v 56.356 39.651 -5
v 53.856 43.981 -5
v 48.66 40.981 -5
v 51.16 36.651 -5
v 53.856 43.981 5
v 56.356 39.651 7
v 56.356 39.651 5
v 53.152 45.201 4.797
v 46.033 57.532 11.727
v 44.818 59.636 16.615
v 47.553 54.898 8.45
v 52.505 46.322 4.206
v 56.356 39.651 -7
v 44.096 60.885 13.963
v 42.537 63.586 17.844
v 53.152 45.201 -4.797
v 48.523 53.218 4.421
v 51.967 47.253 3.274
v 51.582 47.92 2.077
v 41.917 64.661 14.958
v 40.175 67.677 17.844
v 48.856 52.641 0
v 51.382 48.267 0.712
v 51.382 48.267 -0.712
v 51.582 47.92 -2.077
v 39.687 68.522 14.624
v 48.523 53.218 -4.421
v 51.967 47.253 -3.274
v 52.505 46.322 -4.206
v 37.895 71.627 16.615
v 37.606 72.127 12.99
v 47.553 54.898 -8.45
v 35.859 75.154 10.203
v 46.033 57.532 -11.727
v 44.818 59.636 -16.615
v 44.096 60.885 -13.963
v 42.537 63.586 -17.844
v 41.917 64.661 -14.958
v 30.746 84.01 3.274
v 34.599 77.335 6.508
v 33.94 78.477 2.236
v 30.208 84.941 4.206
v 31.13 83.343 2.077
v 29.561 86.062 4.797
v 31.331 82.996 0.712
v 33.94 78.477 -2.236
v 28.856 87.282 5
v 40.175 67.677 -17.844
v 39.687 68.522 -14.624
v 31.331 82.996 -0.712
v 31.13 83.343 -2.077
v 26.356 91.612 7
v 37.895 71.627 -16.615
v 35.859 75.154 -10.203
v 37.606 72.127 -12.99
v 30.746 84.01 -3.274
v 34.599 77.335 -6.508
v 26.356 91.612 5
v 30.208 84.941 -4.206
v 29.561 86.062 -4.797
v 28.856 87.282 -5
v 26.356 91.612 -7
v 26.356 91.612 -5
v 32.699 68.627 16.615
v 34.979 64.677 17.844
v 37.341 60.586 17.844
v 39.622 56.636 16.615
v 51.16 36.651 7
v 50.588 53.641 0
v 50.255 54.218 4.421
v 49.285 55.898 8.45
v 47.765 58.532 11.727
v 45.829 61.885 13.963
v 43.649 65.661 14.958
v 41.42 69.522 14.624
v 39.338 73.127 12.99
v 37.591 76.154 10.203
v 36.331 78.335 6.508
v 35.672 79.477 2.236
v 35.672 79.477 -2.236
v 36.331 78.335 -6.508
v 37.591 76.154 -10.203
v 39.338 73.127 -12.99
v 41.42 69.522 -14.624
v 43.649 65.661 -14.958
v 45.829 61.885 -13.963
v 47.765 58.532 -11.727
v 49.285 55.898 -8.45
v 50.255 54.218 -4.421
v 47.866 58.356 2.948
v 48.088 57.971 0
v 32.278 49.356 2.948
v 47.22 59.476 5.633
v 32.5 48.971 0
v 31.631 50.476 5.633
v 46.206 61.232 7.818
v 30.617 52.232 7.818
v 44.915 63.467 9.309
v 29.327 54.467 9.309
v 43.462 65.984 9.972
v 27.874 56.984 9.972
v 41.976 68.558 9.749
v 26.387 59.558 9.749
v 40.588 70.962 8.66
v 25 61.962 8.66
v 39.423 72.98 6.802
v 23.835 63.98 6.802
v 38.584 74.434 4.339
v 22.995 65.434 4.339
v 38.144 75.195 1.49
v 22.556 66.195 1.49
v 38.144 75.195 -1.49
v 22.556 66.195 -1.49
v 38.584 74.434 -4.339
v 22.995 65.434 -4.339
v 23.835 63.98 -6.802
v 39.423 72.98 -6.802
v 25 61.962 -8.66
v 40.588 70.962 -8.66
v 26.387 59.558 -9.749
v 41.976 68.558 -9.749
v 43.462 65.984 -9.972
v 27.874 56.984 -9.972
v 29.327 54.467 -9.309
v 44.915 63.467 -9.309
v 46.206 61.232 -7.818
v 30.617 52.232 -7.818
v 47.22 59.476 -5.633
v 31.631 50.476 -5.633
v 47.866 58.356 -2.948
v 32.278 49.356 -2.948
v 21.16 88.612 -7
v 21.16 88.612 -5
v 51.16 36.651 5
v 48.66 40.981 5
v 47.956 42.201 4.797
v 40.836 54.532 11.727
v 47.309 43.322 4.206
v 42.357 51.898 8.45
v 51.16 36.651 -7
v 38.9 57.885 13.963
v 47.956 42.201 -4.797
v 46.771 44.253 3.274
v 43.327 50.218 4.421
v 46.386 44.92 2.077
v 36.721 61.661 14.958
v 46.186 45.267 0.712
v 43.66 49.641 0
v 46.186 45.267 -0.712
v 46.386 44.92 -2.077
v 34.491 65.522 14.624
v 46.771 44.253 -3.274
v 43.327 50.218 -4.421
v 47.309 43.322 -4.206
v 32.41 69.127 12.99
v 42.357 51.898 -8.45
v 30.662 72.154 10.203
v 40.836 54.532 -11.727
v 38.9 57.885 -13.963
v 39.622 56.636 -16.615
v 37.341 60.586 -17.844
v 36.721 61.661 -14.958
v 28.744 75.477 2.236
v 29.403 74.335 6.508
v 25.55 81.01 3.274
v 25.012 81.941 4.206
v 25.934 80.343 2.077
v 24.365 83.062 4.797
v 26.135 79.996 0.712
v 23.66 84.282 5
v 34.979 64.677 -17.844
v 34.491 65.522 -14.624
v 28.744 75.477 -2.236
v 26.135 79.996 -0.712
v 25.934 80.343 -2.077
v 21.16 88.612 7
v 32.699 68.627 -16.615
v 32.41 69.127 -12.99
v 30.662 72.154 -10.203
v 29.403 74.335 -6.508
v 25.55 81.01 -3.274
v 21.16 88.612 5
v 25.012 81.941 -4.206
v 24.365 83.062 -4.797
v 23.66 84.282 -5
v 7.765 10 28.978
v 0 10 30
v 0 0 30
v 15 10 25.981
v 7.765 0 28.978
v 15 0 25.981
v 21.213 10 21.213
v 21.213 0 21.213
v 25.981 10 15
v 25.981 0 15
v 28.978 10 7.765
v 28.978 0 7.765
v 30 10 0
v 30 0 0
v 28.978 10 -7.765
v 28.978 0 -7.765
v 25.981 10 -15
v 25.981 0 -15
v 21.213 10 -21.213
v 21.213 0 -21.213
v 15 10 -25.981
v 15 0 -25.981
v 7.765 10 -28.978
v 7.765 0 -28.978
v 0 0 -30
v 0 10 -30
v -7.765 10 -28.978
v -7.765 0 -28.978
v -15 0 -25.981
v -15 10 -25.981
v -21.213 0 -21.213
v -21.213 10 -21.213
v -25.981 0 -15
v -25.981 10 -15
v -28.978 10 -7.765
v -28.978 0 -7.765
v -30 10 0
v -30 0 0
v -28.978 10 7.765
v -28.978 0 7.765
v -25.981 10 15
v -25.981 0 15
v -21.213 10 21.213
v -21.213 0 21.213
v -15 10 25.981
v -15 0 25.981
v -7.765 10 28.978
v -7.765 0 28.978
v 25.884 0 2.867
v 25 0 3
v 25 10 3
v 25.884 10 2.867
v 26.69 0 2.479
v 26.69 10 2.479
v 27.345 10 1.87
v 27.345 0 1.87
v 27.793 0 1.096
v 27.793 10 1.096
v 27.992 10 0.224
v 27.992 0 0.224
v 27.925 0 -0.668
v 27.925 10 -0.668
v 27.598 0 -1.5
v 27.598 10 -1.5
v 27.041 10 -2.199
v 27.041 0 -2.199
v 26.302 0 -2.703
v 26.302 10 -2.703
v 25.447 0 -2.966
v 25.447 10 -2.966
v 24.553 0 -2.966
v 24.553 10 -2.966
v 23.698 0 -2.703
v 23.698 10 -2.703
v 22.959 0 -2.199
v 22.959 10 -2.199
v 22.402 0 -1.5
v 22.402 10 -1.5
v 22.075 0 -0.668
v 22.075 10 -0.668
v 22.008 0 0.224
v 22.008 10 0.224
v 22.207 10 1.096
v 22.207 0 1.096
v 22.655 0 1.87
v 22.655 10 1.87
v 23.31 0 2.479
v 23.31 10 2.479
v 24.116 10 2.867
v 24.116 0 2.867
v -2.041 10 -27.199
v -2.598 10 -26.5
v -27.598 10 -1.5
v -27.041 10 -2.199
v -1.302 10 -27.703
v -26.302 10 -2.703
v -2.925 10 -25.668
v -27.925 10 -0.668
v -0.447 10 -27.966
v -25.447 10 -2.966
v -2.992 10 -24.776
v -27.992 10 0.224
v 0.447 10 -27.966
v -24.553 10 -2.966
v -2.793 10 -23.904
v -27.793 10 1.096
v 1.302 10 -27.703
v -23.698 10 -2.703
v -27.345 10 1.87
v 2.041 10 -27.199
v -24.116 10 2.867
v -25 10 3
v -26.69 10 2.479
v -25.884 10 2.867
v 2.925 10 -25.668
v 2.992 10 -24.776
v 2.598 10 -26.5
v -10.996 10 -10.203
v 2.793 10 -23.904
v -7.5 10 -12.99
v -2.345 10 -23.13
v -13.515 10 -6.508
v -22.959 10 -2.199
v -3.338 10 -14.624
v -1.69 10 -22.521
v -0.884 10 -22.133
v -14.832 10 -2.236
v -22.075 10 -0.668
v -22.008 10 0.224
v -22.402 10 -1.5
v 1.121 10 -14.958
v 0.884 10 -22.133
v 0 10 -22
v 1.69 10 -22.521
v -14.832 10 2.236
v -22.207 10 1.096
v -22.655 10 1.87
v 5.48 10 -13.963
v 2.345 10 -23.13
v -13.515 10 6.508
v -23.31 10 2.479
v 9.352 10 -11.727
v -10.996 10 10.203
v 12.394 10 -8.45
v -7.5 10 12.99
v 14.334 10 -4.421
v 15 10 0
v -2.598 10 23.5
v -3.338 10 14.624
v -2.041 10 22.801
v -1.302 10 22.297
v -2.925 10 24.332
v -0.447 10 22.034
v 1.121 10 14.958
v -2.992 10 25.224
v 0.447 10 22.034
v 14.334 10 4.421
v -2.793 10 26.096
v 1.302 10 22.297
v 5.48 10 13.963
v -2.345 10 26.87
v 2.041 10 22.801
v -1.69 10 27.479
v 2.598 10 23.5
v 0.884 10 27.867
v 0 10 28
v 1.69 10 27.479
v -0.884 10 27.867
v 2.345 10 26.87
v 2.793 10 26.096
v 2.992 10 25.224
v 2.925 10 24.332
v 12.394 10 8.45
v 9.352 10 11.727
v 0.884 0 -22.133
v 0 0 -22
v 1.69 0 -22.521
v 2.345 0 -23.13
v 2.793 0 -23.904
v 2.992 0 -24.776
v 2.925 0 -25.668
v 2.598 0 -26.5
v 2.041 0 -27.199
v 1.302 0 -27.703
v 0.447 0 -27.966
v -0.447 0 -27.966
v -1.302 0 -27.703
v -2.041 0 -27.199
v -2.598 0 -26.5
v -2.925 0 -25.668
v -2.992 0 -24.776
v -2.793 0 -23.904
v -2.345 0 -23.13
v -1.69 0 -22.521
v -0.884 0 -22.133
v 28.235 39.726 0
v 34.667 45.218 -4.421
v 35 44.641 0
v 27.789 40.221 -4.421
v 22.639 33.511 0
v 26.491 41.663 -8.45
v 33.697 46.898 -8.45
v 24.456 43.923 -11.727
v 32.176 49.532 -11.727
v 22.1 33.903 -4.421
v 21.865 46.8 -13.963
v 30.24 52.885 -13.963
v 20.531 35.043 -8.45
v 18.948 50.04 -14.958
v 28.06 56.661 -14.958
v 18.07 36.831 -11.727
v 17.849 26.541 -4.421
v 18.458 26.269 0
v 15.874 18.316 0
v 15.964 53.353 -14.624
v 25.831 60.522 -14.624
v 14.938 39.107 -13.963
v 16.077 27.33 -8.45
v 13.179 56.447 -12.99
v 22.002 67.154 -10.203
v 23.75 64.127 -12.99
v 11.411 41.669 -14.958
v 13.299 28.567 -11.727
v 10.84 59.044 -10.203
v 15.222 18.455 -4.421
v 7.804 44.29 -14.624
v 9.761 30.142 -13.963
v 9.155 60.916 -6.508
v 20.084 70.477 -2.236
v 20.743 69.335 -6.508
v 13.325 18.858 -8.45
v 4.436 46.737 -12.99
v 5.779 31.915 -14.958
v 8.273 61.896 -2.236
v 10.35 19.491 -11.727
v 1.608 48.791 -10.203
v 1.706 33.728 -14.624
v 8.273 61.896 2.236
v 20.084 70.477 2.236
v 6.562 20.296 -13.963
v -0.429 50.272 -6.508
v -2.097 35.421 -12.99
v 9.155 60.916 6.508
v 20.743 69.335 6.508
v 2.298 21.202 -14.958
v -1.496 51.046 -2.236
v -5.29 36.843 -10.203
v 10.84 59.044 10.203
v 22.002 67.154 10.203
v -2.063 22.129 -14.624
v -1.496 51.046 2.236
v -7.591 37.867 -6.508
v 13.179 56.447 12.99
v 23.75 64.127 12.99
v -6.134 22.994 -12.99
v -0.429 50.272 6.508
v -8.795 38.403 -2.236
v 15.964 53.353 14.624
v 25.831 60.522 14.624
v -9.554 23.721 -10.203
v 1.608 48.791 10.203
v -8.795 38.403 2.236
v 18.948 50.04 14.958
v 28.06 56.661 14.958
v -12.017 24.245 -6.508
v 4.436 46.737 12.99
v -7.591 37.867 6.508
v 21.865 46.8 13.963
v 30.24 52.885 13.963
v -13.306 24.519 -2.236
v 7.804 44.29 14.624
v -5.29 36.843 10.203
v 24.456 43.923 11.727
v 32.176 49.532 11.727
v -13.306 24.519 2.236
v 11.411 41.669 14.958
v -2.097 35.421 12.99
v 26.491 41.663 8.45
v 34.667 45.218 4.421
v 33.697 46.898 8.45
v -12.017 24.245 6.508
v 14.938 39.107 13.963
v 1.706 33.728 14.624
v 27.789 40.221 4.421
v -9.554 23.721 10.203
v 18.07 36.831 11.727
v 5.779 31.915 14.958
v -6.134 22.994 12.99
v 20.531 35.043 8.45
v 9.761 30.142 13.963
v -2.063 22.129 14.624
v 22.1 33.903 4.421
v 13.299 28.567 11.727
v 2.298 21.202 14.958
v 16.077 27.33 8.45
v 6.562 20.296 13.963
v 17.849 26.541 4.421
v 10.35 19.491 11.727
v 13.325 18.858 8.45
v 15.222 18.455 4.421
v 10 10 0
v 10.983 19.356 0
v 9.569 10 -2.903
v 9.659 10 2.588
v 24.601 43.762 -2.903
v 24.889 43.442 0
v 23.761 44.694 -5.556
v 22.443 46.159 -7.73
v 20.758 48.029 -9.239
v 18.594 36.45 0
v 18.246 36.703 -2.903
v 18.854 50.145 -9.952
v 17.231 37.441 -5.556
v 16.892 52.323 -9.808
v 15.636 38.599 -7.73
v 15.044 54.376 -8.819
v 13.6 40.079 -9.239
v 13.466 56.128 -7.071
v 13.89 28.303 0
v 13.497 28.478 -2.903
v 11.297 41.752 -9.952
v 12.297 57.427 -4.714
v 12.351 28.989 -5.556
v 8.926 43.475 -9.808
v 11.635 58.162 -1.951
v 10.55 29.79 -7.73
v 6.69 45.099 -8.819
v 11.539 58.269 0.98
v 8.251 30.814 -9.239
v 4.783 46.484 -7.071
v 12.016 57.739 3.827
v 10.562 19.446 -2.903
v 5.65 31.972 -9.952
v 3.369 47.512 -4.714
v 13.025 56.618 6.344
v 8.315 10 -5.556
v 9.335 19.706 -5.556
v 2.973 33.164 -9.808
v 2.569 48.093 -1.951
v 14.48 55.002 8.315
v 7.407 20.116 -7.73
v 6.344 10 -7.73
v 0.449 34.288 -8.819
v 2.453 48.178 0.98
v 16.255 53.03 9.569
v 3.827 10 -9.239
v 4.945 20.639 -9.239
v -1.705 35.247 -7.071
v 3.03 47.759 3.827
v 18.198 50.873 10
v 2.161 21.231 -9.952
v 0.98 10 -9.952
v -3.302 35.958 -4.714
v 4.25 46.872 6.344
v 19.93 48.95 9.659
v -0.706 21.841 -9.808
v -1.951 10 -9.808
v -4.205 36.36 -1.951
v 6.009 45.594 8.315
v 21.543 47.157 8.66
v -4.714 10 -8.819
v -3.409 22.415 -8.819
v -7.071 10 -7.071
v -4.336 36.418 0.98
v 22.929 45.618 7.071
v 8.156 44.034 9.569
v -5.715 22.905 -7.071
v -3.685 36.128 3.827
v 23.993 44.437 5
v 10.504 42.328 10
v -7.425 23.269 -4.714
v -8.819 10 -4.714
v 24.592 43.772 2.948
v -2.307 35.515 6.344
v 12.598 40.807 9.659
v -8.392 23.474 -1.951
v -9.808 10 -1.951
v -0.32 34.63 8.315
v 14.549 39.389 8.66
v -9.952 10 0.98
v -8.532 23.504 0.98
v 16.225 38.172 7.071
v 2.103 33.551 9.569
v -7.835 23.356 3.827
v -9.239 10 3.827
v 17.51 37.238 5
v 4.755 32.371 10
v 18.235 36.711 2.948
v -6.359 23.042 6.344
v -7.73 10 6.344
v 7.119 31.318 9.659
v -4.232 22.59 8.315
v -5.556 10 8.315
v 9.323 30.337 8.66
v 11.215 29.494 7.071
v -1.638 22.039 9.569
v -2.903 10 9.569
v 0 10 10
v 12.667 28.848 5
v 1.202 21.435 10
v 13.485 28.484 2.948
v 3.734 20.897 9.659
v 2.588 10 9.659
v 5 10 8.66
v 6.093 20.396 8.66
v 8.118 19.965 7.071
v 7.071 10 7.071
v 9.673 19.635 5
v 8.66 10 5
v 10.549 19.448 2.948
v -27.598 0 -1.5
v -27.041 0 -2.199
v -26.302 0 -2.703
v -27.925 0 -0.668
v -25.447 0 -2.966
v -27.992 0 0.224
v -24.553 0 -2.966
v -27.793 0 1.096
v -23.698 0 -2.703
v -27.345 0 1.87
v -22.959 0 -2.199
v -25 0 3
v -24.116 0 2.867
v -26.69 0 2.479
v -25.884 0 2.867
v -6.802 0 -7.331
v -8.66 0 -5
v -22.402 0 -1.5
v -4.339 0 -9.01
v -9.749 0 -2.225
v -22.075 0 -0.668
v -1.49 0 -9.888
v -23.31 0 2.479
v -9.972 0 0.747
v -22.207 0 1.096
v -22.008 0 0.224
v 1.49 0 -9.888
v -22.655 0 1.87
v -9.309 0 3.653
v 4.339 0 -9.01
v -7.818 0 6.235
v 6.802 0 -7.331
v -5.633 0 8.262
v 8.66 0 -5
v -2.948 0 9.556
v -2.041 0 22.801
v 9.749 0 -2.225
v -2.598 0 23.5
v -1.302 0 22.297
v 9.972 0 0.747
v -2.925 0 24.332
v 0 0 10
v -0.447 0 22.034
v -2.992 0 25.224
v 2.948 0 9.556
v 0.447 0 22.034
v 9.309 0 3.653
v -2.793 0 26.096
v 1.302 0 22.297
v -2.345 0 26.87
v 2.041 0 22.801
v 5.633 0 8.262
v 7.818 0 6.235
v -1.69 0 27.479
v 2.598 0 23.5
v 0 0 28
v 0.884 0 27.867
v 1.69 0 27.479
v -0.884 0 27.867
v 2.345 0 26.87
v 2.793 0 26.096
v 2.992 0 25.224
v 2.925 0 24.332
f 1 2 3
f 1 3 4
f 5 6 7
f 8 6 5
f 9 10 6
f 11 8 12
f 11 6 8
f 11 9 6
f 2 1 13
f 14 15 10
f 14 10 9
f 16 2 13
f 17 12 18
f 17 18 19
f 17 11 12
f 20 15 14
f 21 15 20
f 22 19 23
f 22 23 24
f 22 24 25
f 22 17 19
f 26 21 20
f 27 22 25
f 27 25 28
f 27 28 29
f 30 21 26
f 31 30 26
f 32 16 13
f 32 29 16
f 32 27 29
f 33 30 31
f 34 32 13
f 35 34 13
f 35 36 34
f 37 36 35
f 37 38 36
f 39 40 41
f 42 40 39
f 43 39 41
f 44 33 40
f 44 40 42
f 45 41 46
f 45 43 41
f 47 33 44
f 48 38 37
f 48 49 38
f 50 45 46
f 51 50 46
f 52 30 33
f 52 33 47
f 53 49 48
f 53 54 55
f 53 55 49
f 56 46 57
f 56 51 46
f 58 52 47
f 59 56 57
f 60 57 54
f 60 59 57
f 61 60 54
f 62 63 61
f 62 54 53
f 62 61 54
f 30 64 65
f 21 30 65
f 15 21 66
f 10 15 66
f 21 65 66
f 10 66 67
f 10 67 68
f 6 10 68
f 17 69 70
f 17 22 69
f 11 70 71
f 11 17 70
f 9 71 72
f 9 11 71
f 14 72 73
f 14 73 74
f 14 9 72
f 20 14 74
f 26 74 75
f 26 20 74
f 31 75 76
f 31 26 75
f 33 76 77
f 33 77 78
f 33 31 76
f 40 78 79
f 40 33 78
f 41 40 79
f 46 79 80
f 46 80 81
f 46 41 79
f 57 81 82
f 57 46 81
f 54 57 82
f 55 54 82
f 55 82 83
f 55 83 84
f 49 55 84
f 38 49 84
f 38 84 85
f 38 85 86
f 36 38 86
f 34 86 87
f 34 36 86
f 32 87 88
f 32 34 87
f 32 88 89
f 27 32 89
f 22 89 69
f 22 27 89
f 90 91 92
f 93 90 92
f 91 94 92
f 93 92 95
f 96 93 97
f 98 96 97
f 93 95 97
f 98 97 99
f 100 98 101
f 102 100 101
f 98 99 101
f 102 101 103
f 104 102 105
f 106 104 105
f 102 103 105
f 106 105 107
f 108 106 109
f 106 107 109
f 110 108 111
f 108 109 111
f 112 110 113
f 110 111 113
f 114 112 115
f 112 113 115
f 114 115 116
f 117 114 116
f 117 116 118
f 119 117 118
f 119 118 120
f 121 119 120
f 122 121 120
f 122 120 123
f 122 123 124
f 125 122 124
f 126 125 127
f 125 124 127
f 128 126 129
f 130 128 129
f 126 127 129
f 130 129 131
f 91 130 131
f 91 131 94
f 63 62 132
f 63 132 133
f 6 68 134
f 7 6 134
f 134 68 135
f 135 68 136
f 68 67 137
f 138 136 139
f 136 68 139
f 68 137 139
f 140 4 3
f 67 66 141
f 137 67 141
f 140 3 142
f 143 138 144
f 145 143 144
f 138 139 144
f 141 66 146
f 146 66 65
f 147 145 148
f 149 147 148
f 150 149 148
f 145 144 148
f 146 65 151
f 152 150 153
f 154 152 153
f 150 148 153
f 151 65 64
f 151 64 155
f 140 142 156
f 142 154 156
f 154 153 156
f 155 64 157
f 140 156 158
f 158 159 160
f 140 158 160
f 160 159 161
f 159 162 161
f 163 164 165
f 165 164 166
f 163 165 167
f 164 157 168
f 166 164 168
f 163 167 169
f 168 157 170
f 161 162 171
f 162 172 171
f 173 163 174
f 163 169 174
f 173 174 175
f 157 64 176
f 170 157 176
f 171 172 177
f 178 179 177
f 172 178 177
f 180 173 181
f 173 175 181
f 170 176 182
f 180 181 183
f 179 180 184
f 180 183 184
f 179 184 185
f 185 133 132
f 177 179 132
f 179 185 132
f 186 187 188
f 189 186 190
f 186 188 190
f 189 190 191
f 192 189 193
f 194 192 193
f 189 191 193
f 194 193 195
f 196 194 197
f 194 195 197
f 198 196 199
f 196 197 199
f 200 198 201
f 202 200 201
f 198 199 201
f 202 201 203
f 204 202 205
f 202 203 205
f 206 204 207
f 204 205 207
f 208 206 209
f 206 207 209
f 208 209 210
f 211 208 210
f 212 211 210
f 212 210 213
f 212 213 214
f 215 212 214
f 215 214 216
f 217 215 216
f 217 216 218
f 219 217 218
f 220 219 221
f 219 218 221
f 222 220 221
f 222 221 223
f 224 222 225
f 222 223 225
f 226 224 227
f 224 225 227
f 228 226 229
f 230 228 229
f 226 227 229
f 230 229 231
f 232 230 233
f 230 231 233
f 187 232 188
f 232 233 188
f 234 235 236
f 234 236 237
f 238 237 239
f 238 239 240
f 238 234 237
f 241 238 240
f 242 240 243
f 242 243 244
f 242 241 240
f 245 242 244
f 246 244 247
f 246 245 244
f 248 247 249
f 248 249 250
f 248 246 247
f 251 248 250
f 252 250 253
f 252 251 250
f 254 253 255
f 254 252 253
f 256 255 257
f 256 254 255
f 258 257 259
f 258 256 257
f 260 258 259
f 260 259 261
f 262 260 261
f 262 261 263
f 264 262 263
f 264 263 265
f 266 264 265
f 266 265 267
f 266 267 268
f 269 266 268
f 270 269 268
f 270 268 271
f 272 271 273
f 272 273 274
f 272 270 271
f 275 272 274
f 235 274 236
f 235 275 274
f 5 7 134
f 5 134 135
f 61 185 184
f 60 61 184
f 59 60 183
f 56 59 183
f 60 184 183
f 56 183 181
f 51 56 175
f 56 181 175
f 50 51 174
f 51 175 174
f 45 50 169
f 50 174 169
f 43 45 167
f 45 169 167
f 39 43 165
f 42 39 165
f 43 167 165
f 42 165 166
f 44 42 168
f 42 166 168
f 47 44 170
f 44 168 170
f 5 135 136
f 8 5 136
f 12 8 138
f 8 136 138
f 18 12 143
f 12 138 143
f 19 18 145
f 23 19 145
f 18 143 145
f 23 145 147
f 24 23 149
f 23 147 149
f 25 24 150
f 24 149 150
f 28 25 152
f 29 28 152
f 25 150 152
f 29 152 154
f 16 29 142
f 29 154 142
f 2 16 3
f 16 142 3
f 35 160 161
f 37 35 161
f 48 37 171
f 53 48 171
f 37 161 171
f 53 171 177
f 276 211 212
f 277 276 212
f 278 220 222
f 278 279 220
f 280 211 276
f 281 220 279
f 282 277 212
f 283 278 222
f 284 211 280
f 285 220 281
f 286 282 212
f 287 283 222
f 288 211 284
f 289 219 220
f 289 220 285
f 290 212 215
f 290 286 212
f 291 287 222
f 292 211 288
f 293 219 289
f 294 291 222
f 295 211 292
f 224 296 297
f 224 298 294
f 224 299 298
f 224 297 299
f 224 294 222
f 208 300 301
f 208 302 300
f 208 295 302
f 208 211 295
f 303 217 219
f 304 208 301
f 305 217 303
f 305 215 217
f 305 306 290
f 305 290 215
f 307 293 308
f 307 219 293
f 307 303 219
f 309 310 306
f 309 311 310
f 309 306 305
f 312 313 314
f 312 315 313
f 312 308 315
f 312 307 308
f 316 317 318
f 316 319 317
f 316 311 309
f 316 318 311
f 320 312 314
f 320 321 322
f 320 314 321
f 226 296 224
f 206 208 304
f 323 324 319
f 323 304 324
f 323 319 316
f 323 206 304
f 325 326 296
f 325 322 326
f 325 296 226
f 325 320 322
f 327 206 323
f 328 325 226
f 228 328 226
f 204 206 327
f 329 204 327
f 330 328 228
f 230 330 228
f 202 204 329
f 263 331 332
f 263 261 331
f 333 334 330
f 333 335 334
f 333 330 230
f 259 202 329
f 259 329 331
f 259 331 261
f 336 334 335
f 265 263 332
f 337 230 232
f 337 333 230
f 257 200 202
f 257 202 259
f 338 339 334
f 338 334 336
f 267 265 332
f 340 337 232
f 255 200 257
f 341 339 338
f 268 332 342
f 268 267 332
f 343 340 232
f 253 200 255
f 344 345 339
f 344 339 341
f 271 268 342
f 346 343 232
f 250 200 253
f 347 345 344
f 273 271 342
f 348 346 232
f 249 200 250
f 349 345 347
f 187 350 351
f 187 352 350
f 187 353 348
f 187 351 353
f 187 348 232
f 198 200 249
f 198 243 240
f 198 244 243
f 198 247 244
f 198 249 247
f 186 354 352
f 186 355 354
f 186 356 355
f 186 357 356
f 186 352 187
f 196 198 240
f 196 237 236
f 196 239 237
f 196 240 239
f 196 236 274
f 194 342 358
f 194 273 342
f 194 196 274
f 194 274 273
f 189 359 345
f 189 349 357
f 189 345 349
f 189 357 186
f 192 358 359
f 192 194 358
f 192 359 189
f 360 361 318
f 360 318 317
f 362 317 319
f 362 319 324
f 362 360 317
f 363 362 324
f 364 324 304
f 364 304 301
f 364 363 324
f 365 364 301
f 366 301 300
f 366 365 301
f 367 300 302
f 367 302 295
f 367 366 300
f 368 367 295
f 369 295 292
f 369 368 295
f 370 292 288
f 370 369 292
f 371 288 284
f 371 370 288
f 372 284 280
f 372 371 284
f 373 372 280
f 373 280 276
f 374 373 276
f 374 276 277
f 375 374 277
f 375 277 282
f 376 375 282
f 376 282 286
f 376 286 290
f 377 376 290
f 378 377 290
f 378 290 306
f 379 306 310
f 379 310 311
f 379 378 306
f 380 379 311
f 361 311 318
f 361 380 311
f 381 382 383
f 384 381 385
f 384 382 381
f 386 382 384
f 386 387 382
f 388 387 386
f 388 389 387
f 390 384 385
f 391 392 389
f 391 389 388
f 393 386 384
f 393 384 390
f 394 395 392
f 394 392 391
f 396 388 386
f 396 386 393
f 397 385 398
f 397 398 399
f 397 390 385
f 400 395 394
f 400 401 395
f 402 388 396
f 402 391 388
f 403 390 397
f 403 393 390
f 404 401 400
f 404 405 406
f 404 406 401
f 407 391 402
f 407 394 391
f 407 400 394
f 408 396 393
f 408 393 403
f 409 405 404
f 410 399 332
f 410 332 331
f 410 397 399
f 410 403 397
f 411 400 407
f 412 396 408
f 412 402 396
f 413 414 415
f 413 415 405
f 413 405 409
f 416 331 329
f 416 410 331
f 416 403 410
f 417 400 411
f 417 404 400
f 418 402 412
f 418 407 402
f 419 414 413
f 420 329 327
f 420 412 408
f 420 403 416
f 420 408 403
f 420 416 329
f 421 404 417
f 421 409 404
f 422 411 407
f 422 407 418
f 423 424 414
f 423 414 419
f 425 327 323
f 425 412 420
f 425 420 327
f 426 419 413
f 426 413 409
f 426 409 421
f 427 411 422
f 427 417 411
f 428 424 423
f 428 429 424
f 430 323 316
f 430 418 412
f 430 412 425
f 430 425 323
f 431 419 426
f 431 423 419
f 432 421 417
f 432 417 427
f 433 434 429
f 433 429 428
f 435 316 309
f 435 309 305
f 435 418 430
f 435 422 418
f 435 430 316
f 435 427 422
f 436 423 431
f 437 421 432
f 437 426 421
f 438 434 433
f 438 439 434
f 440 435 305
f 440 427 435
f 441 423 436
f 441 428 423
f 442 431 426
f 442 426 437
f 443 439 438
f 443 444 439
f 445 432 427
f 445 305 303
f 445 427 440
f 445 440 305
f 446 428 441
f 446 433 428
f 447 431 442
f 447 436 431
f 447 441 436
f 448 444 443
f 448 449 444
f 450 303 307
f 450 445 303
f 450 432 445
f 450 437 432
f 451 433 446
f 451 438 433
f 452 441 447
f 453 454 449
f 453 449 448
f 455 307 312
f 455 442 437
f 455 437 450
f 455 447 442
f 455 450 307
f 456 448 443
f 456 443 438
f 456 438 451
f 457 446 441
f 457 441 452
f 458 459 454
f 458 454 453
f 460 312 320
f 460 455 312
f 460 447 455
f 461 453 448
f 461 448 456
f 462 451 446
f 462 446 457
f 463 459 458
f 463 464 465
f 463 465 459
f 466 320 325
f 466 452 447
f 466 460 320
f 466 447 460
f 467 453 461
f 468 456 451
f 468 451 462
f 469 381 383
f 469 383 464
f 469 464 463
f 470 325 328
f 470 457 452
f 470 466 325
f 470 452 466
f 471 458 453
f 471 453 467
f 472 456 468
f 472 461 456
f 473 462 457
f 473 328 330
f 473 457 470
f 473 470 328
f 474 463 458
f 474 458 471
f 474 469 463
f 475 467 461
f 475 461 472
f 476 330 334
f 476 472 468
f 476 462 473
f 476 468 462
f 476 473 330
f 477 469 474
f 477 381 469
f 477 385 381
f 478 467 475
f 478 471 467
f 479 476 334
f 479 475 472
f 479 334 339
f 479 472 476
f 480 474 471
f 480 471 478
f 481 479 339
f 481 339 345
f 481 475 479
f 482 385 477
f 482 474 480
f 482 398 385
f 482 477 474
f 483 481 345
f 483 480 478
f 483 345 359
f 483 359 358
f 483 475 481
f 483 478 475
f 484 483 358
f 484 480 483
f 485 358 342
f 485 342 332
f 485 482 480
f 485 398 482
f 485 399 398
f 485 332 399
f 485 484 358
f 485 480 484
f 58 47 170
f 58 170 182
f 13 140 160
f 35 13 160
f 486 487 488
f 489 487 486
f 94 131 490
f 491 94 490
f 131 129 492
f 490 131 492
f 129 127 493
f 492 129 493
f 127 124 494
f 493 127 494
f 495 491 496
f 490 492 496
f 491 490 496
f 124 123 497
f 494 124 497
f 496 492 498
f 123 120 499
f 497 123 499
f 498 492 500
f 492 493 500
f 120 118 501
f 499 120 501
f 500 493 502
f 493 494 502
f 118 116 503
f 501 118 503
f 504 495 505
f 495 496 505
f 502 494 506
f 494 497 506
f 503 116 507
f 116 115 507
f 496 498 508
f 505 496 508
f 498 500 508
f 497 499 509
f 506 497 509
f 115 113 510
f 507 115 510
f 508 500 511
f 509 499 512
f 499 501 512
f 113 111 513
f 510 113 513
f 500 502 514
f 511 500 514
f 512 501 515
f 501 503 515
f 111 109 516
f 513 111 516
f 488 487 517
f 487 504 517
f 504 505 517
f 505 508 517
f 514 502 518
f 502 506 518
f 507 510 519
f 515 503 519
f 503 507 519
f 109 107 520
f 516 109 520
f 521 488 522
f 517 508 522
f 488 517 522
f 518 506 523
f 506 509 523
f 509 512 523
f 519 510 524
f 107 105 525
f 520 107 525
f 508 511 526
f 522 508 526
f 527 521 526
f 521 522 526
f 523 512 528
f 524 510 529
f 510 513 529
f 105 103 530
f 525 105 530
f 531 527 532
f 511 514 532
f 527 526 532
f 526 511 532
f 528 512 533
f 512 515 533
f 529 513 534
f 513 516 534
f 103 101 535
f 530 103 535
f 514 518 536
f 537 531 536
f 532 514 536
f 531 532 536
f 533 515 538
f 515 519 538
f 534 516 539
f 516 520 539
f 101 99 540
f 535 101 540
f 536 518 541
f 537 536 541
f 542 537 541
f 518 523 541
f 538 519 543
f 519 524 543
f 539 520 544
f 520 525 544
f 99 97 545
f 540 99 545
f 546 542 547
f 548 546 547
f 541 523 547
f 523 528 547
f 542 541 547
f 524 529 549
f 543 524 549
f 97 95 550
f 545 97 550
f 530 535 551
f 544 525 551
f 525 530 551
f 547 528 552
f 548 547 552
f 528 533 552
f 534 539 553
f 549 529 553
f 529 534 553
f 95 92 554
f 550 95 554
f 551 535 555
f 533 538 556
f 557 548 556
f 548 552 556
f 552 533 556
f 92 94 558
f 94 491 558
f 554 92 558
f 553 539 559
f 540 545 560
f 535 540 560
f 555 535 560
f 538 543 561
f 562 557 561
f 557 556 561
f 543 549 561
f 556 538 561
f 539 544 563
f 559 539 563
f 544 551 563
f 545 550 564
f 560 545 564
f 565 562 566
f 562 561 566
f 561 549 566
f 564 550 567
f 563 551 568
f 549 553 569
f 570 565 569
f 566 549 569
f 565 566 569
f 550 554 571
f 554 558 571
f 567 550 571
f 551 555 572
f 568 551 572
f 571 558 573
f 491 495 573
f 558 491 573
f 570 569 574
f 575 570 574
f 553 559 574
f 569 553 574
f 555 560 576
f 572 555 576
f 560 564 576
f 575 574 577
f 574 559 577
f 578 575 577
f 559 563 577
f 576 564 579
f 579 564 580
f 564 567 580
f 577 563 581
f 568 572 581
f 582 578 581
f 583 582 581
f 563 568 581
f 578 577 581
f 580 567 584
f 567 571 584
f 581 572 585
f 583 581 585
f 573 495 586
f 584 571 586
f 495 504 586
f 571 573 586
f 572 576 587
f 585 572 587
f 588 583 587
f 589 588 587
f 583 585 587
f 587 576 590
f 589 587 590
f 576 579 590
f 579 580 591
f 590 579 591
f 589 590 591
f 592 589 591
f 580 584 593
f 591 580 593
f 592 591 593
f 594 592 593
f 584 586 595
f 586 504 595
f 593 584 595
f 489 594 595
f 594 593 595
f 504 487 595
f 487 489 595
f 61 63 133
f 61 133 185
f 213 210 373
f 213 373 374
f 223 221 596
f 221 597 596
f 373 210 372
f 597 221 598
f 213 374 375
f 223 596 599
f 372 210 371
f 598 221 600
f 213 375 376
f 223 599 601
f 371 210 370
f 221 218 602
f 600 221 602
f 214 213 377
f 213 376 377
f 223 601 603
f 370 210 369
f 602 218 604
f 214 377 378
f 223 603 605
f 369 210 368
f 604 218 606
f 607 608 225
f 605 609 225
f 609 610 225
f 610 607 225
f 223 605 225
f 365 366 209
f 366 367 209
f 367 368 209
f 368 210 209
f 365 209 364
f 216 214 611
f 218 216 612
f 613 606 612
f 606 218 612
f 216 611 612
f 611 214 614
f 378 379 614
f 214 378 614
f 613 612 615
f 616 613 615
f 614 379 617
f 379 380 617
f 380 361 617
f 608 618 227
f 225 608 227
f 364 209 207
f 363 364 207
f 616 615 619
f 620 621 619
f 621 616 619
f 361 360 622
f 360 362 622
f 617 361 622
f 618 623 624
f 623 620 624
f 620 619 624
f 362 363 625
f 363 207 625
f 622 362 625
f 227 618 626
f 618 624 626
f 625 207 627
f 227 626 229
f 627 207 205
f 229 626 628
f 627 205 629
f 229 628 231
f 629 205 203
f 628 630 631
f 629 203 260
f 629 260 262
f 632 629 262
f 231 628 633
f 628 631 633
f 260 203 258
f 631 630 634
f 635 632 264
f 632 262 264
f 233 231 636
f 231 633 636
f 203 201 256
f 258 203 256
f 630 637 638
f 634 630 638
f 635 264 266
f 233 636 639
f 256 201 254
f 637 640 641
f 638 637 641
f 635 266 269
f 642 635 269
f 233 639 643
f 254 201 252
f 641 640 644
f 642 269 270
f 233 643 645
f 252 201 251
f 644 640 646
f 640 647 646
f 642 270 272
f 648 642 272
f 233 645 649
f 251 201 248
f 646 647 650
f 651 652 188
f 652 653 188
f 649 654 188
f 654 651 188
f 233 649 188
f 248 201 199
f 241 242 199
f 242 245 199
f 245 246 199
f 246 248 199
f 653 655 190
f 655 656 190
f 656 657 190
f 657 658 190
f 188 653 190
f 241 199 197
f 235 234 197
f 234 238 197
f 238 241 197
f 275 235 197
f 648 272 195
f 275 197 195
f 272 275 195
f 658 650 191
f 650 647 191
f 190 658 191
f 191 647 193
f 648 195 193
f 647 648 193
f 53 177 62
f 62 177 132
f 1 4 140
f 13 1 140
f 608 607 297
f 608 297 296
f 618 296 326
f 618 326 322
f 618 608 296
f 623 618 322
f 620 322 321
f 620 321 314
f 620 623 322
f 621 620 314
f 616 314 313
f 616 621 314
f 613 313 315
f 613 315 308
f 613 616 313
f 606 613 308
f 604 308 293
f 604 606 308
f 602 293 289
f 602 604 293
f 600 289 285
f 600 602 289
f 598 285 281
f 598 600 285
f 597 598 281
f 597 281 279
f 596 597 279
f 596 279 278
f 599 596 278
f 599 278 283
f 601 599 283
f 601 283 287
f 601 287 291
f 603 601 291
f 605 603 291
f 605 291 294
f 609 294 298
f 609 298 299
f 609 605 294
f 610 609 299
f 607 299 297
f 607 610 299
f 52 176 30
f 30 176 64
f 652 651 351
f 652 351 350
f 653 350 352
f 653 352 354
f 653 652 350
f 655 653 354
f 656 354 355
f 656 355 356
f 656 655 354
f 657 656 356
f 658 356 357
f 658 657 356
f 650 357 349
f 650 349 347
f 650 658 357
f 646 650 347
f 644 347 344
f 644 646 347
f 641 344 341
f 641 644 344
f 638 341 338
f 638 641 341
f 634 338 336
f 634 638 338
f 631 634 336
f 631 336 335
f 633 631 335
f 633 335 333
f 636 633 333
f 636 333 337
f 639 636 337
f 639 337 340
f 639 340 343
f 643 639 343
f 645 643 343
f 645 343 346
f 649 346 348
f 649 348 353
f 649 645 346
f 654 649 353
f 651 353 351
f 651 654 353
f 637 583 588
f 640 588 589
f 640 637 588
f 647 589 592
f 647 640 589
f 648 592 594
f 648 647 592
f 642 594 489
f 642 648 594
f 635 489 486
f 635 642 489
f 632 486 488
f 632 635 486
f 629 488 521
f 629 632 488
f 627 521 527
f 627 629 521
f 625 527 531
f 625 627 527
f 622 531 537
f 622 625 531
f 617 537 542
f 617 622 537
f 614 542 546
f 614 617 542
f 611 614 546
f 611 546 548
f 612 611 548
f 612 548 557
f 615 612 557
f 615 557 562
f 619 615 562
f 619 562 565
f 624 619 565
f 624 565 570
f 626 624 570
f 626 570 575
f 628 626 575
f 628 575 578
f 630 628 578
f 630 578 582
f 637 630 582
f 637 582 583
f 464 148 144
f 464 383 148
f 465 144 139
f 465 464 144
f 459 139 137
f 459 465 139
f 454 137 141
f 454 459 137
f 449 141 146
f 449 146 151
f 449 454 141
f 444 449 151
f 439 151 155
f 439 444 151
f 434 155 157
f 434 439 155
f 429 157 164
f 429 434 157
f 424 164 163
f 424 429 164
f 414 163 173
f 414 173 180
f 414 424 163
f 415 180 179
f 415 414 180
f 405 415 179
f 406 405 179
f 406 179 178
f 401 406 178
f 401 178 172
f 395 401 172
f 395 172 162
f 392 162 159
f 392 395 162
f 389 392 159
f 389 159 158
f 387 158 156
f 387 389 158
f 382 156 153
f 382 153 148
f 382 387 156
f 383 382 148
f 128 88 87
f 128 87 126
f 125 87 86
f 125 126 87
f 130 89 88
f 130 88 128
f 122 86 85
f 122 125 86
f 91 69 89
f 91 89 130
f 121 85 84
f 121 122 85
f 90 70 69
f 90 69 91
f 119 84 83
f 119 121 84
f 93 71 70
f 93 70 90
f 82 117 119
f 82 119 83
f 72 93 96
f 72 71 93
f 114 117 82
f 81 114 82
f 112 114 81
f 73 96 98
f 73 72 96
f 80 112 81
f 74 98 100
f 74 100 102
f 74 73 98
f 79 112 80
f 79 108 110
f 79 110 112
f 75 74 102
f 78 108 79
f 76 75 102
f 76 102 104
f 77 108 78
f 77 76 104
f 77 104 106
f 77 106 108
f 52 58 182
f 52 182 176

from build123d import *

# Parameters (mm, degrees)
SKETCH_1_R      = 30
SKETCH_1_R_2    = 10
SKETCH_1_R_3    = 3
EXTRUDE_1_DEPTH = 10
SKETCH_2_R      = 15
SKETCH_2_R_2    = 10
EXTRUDE_START   = -6
SKETCH_5_R      = 10
EXTRUDE_2_DEPTH = 6


with BuildPart() as part:
    # 草图1 → 凸台-拉伸1 (new body)
    with BuildSketch(Plane(origin=(0, 0, 0), x_dir=(1, 0, 0), z_dir=(0, 1, 0))):
        with Locations(Location((0, 0, 0), (0, 0, 270))):
            Circle(SKETCH_1_R)
        with Locations(Location((0, 0, 0), (0, 0, 270))):
            Circle(SKETCH_1_R_2, mode=Mode.SUBTRACT)
        with Locations(Location((25, 0, 0), (0, 0, 270))):
            Circle(SKETCH_1_R_3, mode=Mode.SUBTRACT)
        with Locations(Location((0, -25, 0), (0, 0, 270))):
            Circle(SKETCH_1_R_3, mode=Mode.SUBTRACT)
        with Locations(Location((-25, 0, 0), (0, 0, 270))):
            Circle(SKETCH_1_R_3, mode=Mode.SUBTRACT)
        with Locations(Location((0, 25, 0), (0, 0, 270))):
            Circle(SKETCH_1_R_3, mode=Mode.SUBTRACT)
    extrude(amount=EXTRUDE_1_DEPTH)

    # 扫描1: sweep along a path in 草图3
    with BuildLine(Plane.XY) as sweep_1_path:
        Line((43.088457268, 66.631397208), (27.5, 57.631397208))
        ThreePointArc((27.5, 57.631397208), (7.368602792, 37.5), (0, 10))
    # 草图2 → 扫描1 (sweep)
    with BuildSketch(Plane(origin=(0, 10, 0), x_dir=(1, 0, 0), z_dir=(0, 1, 0))):
        Circle(SKETCH_2_R)
        Circle(SKETCH_2_R_2, mode=Mode.SUBTRACT)
    sweep(path=sweep_1_path.line)

    # 草图5 → 凸台-拉伸2 (add)
    with BuildSketch(Plane(origin=(59.436533479, 34.315698604, 0), x_dir=(0, 0, -1), z_dir=(0.866025403784436, 0.5000000000000044, 0)).offset(EXTRUDE_START)):
        with BuildLine():
            Line((-7, 6.160254038), (-5, 6.160254038))
            Line((-5, 6.160254038), (-5, 11.160254038))
            ThreePointArc((-5, 11.160254038), (0, 16.160254038), (5, 11.160254038))
            Line((5, 11.160254038), (5, 6.160254038))
            Line((5, 6.160254038), (7, 6.160254038))
            Line((7, 6.160254038), (16.615384615, 29.237177115))
            ThreePointArc((16.615384615, 29.237177115), (18, 36.160254038), (16.615384615, 43.083330961))
            Line((16.615384615, 43.083330961), (7, 66.160254038))
            Line((7, 66.160254038), (5, 66.160254038))
            Line((5, 66.160254038), (5, 61.160254038))
            ThreePointArc((5, 61.160254038), (0, 56.160254038), (-5, 61.160254038))
            Line((-5, 61.160254038), (-5, 66.160254038))
            Line((-5, 66.160254038), (-7, 66.160254038))
            Line((-7, 66.160254038), (-16.615384615, 43.083330961))
            ThreePointArc((-16.615384615, 43.083330961), (-18, 36.160254038), (-16.615384615, 29.237177115))
            Line((-16.615384615, 29.237177115), (-7, 6.160254038))
        make_face()
        with Locations(Location((0, 36.160254038, 0), (0, 0, 90))):
            Circle(SKETCH_5_R, mode=Mode.SUBTRACT)
    extrude(amount=EXTRUDE_2_DEPTH)


solid = part.part
